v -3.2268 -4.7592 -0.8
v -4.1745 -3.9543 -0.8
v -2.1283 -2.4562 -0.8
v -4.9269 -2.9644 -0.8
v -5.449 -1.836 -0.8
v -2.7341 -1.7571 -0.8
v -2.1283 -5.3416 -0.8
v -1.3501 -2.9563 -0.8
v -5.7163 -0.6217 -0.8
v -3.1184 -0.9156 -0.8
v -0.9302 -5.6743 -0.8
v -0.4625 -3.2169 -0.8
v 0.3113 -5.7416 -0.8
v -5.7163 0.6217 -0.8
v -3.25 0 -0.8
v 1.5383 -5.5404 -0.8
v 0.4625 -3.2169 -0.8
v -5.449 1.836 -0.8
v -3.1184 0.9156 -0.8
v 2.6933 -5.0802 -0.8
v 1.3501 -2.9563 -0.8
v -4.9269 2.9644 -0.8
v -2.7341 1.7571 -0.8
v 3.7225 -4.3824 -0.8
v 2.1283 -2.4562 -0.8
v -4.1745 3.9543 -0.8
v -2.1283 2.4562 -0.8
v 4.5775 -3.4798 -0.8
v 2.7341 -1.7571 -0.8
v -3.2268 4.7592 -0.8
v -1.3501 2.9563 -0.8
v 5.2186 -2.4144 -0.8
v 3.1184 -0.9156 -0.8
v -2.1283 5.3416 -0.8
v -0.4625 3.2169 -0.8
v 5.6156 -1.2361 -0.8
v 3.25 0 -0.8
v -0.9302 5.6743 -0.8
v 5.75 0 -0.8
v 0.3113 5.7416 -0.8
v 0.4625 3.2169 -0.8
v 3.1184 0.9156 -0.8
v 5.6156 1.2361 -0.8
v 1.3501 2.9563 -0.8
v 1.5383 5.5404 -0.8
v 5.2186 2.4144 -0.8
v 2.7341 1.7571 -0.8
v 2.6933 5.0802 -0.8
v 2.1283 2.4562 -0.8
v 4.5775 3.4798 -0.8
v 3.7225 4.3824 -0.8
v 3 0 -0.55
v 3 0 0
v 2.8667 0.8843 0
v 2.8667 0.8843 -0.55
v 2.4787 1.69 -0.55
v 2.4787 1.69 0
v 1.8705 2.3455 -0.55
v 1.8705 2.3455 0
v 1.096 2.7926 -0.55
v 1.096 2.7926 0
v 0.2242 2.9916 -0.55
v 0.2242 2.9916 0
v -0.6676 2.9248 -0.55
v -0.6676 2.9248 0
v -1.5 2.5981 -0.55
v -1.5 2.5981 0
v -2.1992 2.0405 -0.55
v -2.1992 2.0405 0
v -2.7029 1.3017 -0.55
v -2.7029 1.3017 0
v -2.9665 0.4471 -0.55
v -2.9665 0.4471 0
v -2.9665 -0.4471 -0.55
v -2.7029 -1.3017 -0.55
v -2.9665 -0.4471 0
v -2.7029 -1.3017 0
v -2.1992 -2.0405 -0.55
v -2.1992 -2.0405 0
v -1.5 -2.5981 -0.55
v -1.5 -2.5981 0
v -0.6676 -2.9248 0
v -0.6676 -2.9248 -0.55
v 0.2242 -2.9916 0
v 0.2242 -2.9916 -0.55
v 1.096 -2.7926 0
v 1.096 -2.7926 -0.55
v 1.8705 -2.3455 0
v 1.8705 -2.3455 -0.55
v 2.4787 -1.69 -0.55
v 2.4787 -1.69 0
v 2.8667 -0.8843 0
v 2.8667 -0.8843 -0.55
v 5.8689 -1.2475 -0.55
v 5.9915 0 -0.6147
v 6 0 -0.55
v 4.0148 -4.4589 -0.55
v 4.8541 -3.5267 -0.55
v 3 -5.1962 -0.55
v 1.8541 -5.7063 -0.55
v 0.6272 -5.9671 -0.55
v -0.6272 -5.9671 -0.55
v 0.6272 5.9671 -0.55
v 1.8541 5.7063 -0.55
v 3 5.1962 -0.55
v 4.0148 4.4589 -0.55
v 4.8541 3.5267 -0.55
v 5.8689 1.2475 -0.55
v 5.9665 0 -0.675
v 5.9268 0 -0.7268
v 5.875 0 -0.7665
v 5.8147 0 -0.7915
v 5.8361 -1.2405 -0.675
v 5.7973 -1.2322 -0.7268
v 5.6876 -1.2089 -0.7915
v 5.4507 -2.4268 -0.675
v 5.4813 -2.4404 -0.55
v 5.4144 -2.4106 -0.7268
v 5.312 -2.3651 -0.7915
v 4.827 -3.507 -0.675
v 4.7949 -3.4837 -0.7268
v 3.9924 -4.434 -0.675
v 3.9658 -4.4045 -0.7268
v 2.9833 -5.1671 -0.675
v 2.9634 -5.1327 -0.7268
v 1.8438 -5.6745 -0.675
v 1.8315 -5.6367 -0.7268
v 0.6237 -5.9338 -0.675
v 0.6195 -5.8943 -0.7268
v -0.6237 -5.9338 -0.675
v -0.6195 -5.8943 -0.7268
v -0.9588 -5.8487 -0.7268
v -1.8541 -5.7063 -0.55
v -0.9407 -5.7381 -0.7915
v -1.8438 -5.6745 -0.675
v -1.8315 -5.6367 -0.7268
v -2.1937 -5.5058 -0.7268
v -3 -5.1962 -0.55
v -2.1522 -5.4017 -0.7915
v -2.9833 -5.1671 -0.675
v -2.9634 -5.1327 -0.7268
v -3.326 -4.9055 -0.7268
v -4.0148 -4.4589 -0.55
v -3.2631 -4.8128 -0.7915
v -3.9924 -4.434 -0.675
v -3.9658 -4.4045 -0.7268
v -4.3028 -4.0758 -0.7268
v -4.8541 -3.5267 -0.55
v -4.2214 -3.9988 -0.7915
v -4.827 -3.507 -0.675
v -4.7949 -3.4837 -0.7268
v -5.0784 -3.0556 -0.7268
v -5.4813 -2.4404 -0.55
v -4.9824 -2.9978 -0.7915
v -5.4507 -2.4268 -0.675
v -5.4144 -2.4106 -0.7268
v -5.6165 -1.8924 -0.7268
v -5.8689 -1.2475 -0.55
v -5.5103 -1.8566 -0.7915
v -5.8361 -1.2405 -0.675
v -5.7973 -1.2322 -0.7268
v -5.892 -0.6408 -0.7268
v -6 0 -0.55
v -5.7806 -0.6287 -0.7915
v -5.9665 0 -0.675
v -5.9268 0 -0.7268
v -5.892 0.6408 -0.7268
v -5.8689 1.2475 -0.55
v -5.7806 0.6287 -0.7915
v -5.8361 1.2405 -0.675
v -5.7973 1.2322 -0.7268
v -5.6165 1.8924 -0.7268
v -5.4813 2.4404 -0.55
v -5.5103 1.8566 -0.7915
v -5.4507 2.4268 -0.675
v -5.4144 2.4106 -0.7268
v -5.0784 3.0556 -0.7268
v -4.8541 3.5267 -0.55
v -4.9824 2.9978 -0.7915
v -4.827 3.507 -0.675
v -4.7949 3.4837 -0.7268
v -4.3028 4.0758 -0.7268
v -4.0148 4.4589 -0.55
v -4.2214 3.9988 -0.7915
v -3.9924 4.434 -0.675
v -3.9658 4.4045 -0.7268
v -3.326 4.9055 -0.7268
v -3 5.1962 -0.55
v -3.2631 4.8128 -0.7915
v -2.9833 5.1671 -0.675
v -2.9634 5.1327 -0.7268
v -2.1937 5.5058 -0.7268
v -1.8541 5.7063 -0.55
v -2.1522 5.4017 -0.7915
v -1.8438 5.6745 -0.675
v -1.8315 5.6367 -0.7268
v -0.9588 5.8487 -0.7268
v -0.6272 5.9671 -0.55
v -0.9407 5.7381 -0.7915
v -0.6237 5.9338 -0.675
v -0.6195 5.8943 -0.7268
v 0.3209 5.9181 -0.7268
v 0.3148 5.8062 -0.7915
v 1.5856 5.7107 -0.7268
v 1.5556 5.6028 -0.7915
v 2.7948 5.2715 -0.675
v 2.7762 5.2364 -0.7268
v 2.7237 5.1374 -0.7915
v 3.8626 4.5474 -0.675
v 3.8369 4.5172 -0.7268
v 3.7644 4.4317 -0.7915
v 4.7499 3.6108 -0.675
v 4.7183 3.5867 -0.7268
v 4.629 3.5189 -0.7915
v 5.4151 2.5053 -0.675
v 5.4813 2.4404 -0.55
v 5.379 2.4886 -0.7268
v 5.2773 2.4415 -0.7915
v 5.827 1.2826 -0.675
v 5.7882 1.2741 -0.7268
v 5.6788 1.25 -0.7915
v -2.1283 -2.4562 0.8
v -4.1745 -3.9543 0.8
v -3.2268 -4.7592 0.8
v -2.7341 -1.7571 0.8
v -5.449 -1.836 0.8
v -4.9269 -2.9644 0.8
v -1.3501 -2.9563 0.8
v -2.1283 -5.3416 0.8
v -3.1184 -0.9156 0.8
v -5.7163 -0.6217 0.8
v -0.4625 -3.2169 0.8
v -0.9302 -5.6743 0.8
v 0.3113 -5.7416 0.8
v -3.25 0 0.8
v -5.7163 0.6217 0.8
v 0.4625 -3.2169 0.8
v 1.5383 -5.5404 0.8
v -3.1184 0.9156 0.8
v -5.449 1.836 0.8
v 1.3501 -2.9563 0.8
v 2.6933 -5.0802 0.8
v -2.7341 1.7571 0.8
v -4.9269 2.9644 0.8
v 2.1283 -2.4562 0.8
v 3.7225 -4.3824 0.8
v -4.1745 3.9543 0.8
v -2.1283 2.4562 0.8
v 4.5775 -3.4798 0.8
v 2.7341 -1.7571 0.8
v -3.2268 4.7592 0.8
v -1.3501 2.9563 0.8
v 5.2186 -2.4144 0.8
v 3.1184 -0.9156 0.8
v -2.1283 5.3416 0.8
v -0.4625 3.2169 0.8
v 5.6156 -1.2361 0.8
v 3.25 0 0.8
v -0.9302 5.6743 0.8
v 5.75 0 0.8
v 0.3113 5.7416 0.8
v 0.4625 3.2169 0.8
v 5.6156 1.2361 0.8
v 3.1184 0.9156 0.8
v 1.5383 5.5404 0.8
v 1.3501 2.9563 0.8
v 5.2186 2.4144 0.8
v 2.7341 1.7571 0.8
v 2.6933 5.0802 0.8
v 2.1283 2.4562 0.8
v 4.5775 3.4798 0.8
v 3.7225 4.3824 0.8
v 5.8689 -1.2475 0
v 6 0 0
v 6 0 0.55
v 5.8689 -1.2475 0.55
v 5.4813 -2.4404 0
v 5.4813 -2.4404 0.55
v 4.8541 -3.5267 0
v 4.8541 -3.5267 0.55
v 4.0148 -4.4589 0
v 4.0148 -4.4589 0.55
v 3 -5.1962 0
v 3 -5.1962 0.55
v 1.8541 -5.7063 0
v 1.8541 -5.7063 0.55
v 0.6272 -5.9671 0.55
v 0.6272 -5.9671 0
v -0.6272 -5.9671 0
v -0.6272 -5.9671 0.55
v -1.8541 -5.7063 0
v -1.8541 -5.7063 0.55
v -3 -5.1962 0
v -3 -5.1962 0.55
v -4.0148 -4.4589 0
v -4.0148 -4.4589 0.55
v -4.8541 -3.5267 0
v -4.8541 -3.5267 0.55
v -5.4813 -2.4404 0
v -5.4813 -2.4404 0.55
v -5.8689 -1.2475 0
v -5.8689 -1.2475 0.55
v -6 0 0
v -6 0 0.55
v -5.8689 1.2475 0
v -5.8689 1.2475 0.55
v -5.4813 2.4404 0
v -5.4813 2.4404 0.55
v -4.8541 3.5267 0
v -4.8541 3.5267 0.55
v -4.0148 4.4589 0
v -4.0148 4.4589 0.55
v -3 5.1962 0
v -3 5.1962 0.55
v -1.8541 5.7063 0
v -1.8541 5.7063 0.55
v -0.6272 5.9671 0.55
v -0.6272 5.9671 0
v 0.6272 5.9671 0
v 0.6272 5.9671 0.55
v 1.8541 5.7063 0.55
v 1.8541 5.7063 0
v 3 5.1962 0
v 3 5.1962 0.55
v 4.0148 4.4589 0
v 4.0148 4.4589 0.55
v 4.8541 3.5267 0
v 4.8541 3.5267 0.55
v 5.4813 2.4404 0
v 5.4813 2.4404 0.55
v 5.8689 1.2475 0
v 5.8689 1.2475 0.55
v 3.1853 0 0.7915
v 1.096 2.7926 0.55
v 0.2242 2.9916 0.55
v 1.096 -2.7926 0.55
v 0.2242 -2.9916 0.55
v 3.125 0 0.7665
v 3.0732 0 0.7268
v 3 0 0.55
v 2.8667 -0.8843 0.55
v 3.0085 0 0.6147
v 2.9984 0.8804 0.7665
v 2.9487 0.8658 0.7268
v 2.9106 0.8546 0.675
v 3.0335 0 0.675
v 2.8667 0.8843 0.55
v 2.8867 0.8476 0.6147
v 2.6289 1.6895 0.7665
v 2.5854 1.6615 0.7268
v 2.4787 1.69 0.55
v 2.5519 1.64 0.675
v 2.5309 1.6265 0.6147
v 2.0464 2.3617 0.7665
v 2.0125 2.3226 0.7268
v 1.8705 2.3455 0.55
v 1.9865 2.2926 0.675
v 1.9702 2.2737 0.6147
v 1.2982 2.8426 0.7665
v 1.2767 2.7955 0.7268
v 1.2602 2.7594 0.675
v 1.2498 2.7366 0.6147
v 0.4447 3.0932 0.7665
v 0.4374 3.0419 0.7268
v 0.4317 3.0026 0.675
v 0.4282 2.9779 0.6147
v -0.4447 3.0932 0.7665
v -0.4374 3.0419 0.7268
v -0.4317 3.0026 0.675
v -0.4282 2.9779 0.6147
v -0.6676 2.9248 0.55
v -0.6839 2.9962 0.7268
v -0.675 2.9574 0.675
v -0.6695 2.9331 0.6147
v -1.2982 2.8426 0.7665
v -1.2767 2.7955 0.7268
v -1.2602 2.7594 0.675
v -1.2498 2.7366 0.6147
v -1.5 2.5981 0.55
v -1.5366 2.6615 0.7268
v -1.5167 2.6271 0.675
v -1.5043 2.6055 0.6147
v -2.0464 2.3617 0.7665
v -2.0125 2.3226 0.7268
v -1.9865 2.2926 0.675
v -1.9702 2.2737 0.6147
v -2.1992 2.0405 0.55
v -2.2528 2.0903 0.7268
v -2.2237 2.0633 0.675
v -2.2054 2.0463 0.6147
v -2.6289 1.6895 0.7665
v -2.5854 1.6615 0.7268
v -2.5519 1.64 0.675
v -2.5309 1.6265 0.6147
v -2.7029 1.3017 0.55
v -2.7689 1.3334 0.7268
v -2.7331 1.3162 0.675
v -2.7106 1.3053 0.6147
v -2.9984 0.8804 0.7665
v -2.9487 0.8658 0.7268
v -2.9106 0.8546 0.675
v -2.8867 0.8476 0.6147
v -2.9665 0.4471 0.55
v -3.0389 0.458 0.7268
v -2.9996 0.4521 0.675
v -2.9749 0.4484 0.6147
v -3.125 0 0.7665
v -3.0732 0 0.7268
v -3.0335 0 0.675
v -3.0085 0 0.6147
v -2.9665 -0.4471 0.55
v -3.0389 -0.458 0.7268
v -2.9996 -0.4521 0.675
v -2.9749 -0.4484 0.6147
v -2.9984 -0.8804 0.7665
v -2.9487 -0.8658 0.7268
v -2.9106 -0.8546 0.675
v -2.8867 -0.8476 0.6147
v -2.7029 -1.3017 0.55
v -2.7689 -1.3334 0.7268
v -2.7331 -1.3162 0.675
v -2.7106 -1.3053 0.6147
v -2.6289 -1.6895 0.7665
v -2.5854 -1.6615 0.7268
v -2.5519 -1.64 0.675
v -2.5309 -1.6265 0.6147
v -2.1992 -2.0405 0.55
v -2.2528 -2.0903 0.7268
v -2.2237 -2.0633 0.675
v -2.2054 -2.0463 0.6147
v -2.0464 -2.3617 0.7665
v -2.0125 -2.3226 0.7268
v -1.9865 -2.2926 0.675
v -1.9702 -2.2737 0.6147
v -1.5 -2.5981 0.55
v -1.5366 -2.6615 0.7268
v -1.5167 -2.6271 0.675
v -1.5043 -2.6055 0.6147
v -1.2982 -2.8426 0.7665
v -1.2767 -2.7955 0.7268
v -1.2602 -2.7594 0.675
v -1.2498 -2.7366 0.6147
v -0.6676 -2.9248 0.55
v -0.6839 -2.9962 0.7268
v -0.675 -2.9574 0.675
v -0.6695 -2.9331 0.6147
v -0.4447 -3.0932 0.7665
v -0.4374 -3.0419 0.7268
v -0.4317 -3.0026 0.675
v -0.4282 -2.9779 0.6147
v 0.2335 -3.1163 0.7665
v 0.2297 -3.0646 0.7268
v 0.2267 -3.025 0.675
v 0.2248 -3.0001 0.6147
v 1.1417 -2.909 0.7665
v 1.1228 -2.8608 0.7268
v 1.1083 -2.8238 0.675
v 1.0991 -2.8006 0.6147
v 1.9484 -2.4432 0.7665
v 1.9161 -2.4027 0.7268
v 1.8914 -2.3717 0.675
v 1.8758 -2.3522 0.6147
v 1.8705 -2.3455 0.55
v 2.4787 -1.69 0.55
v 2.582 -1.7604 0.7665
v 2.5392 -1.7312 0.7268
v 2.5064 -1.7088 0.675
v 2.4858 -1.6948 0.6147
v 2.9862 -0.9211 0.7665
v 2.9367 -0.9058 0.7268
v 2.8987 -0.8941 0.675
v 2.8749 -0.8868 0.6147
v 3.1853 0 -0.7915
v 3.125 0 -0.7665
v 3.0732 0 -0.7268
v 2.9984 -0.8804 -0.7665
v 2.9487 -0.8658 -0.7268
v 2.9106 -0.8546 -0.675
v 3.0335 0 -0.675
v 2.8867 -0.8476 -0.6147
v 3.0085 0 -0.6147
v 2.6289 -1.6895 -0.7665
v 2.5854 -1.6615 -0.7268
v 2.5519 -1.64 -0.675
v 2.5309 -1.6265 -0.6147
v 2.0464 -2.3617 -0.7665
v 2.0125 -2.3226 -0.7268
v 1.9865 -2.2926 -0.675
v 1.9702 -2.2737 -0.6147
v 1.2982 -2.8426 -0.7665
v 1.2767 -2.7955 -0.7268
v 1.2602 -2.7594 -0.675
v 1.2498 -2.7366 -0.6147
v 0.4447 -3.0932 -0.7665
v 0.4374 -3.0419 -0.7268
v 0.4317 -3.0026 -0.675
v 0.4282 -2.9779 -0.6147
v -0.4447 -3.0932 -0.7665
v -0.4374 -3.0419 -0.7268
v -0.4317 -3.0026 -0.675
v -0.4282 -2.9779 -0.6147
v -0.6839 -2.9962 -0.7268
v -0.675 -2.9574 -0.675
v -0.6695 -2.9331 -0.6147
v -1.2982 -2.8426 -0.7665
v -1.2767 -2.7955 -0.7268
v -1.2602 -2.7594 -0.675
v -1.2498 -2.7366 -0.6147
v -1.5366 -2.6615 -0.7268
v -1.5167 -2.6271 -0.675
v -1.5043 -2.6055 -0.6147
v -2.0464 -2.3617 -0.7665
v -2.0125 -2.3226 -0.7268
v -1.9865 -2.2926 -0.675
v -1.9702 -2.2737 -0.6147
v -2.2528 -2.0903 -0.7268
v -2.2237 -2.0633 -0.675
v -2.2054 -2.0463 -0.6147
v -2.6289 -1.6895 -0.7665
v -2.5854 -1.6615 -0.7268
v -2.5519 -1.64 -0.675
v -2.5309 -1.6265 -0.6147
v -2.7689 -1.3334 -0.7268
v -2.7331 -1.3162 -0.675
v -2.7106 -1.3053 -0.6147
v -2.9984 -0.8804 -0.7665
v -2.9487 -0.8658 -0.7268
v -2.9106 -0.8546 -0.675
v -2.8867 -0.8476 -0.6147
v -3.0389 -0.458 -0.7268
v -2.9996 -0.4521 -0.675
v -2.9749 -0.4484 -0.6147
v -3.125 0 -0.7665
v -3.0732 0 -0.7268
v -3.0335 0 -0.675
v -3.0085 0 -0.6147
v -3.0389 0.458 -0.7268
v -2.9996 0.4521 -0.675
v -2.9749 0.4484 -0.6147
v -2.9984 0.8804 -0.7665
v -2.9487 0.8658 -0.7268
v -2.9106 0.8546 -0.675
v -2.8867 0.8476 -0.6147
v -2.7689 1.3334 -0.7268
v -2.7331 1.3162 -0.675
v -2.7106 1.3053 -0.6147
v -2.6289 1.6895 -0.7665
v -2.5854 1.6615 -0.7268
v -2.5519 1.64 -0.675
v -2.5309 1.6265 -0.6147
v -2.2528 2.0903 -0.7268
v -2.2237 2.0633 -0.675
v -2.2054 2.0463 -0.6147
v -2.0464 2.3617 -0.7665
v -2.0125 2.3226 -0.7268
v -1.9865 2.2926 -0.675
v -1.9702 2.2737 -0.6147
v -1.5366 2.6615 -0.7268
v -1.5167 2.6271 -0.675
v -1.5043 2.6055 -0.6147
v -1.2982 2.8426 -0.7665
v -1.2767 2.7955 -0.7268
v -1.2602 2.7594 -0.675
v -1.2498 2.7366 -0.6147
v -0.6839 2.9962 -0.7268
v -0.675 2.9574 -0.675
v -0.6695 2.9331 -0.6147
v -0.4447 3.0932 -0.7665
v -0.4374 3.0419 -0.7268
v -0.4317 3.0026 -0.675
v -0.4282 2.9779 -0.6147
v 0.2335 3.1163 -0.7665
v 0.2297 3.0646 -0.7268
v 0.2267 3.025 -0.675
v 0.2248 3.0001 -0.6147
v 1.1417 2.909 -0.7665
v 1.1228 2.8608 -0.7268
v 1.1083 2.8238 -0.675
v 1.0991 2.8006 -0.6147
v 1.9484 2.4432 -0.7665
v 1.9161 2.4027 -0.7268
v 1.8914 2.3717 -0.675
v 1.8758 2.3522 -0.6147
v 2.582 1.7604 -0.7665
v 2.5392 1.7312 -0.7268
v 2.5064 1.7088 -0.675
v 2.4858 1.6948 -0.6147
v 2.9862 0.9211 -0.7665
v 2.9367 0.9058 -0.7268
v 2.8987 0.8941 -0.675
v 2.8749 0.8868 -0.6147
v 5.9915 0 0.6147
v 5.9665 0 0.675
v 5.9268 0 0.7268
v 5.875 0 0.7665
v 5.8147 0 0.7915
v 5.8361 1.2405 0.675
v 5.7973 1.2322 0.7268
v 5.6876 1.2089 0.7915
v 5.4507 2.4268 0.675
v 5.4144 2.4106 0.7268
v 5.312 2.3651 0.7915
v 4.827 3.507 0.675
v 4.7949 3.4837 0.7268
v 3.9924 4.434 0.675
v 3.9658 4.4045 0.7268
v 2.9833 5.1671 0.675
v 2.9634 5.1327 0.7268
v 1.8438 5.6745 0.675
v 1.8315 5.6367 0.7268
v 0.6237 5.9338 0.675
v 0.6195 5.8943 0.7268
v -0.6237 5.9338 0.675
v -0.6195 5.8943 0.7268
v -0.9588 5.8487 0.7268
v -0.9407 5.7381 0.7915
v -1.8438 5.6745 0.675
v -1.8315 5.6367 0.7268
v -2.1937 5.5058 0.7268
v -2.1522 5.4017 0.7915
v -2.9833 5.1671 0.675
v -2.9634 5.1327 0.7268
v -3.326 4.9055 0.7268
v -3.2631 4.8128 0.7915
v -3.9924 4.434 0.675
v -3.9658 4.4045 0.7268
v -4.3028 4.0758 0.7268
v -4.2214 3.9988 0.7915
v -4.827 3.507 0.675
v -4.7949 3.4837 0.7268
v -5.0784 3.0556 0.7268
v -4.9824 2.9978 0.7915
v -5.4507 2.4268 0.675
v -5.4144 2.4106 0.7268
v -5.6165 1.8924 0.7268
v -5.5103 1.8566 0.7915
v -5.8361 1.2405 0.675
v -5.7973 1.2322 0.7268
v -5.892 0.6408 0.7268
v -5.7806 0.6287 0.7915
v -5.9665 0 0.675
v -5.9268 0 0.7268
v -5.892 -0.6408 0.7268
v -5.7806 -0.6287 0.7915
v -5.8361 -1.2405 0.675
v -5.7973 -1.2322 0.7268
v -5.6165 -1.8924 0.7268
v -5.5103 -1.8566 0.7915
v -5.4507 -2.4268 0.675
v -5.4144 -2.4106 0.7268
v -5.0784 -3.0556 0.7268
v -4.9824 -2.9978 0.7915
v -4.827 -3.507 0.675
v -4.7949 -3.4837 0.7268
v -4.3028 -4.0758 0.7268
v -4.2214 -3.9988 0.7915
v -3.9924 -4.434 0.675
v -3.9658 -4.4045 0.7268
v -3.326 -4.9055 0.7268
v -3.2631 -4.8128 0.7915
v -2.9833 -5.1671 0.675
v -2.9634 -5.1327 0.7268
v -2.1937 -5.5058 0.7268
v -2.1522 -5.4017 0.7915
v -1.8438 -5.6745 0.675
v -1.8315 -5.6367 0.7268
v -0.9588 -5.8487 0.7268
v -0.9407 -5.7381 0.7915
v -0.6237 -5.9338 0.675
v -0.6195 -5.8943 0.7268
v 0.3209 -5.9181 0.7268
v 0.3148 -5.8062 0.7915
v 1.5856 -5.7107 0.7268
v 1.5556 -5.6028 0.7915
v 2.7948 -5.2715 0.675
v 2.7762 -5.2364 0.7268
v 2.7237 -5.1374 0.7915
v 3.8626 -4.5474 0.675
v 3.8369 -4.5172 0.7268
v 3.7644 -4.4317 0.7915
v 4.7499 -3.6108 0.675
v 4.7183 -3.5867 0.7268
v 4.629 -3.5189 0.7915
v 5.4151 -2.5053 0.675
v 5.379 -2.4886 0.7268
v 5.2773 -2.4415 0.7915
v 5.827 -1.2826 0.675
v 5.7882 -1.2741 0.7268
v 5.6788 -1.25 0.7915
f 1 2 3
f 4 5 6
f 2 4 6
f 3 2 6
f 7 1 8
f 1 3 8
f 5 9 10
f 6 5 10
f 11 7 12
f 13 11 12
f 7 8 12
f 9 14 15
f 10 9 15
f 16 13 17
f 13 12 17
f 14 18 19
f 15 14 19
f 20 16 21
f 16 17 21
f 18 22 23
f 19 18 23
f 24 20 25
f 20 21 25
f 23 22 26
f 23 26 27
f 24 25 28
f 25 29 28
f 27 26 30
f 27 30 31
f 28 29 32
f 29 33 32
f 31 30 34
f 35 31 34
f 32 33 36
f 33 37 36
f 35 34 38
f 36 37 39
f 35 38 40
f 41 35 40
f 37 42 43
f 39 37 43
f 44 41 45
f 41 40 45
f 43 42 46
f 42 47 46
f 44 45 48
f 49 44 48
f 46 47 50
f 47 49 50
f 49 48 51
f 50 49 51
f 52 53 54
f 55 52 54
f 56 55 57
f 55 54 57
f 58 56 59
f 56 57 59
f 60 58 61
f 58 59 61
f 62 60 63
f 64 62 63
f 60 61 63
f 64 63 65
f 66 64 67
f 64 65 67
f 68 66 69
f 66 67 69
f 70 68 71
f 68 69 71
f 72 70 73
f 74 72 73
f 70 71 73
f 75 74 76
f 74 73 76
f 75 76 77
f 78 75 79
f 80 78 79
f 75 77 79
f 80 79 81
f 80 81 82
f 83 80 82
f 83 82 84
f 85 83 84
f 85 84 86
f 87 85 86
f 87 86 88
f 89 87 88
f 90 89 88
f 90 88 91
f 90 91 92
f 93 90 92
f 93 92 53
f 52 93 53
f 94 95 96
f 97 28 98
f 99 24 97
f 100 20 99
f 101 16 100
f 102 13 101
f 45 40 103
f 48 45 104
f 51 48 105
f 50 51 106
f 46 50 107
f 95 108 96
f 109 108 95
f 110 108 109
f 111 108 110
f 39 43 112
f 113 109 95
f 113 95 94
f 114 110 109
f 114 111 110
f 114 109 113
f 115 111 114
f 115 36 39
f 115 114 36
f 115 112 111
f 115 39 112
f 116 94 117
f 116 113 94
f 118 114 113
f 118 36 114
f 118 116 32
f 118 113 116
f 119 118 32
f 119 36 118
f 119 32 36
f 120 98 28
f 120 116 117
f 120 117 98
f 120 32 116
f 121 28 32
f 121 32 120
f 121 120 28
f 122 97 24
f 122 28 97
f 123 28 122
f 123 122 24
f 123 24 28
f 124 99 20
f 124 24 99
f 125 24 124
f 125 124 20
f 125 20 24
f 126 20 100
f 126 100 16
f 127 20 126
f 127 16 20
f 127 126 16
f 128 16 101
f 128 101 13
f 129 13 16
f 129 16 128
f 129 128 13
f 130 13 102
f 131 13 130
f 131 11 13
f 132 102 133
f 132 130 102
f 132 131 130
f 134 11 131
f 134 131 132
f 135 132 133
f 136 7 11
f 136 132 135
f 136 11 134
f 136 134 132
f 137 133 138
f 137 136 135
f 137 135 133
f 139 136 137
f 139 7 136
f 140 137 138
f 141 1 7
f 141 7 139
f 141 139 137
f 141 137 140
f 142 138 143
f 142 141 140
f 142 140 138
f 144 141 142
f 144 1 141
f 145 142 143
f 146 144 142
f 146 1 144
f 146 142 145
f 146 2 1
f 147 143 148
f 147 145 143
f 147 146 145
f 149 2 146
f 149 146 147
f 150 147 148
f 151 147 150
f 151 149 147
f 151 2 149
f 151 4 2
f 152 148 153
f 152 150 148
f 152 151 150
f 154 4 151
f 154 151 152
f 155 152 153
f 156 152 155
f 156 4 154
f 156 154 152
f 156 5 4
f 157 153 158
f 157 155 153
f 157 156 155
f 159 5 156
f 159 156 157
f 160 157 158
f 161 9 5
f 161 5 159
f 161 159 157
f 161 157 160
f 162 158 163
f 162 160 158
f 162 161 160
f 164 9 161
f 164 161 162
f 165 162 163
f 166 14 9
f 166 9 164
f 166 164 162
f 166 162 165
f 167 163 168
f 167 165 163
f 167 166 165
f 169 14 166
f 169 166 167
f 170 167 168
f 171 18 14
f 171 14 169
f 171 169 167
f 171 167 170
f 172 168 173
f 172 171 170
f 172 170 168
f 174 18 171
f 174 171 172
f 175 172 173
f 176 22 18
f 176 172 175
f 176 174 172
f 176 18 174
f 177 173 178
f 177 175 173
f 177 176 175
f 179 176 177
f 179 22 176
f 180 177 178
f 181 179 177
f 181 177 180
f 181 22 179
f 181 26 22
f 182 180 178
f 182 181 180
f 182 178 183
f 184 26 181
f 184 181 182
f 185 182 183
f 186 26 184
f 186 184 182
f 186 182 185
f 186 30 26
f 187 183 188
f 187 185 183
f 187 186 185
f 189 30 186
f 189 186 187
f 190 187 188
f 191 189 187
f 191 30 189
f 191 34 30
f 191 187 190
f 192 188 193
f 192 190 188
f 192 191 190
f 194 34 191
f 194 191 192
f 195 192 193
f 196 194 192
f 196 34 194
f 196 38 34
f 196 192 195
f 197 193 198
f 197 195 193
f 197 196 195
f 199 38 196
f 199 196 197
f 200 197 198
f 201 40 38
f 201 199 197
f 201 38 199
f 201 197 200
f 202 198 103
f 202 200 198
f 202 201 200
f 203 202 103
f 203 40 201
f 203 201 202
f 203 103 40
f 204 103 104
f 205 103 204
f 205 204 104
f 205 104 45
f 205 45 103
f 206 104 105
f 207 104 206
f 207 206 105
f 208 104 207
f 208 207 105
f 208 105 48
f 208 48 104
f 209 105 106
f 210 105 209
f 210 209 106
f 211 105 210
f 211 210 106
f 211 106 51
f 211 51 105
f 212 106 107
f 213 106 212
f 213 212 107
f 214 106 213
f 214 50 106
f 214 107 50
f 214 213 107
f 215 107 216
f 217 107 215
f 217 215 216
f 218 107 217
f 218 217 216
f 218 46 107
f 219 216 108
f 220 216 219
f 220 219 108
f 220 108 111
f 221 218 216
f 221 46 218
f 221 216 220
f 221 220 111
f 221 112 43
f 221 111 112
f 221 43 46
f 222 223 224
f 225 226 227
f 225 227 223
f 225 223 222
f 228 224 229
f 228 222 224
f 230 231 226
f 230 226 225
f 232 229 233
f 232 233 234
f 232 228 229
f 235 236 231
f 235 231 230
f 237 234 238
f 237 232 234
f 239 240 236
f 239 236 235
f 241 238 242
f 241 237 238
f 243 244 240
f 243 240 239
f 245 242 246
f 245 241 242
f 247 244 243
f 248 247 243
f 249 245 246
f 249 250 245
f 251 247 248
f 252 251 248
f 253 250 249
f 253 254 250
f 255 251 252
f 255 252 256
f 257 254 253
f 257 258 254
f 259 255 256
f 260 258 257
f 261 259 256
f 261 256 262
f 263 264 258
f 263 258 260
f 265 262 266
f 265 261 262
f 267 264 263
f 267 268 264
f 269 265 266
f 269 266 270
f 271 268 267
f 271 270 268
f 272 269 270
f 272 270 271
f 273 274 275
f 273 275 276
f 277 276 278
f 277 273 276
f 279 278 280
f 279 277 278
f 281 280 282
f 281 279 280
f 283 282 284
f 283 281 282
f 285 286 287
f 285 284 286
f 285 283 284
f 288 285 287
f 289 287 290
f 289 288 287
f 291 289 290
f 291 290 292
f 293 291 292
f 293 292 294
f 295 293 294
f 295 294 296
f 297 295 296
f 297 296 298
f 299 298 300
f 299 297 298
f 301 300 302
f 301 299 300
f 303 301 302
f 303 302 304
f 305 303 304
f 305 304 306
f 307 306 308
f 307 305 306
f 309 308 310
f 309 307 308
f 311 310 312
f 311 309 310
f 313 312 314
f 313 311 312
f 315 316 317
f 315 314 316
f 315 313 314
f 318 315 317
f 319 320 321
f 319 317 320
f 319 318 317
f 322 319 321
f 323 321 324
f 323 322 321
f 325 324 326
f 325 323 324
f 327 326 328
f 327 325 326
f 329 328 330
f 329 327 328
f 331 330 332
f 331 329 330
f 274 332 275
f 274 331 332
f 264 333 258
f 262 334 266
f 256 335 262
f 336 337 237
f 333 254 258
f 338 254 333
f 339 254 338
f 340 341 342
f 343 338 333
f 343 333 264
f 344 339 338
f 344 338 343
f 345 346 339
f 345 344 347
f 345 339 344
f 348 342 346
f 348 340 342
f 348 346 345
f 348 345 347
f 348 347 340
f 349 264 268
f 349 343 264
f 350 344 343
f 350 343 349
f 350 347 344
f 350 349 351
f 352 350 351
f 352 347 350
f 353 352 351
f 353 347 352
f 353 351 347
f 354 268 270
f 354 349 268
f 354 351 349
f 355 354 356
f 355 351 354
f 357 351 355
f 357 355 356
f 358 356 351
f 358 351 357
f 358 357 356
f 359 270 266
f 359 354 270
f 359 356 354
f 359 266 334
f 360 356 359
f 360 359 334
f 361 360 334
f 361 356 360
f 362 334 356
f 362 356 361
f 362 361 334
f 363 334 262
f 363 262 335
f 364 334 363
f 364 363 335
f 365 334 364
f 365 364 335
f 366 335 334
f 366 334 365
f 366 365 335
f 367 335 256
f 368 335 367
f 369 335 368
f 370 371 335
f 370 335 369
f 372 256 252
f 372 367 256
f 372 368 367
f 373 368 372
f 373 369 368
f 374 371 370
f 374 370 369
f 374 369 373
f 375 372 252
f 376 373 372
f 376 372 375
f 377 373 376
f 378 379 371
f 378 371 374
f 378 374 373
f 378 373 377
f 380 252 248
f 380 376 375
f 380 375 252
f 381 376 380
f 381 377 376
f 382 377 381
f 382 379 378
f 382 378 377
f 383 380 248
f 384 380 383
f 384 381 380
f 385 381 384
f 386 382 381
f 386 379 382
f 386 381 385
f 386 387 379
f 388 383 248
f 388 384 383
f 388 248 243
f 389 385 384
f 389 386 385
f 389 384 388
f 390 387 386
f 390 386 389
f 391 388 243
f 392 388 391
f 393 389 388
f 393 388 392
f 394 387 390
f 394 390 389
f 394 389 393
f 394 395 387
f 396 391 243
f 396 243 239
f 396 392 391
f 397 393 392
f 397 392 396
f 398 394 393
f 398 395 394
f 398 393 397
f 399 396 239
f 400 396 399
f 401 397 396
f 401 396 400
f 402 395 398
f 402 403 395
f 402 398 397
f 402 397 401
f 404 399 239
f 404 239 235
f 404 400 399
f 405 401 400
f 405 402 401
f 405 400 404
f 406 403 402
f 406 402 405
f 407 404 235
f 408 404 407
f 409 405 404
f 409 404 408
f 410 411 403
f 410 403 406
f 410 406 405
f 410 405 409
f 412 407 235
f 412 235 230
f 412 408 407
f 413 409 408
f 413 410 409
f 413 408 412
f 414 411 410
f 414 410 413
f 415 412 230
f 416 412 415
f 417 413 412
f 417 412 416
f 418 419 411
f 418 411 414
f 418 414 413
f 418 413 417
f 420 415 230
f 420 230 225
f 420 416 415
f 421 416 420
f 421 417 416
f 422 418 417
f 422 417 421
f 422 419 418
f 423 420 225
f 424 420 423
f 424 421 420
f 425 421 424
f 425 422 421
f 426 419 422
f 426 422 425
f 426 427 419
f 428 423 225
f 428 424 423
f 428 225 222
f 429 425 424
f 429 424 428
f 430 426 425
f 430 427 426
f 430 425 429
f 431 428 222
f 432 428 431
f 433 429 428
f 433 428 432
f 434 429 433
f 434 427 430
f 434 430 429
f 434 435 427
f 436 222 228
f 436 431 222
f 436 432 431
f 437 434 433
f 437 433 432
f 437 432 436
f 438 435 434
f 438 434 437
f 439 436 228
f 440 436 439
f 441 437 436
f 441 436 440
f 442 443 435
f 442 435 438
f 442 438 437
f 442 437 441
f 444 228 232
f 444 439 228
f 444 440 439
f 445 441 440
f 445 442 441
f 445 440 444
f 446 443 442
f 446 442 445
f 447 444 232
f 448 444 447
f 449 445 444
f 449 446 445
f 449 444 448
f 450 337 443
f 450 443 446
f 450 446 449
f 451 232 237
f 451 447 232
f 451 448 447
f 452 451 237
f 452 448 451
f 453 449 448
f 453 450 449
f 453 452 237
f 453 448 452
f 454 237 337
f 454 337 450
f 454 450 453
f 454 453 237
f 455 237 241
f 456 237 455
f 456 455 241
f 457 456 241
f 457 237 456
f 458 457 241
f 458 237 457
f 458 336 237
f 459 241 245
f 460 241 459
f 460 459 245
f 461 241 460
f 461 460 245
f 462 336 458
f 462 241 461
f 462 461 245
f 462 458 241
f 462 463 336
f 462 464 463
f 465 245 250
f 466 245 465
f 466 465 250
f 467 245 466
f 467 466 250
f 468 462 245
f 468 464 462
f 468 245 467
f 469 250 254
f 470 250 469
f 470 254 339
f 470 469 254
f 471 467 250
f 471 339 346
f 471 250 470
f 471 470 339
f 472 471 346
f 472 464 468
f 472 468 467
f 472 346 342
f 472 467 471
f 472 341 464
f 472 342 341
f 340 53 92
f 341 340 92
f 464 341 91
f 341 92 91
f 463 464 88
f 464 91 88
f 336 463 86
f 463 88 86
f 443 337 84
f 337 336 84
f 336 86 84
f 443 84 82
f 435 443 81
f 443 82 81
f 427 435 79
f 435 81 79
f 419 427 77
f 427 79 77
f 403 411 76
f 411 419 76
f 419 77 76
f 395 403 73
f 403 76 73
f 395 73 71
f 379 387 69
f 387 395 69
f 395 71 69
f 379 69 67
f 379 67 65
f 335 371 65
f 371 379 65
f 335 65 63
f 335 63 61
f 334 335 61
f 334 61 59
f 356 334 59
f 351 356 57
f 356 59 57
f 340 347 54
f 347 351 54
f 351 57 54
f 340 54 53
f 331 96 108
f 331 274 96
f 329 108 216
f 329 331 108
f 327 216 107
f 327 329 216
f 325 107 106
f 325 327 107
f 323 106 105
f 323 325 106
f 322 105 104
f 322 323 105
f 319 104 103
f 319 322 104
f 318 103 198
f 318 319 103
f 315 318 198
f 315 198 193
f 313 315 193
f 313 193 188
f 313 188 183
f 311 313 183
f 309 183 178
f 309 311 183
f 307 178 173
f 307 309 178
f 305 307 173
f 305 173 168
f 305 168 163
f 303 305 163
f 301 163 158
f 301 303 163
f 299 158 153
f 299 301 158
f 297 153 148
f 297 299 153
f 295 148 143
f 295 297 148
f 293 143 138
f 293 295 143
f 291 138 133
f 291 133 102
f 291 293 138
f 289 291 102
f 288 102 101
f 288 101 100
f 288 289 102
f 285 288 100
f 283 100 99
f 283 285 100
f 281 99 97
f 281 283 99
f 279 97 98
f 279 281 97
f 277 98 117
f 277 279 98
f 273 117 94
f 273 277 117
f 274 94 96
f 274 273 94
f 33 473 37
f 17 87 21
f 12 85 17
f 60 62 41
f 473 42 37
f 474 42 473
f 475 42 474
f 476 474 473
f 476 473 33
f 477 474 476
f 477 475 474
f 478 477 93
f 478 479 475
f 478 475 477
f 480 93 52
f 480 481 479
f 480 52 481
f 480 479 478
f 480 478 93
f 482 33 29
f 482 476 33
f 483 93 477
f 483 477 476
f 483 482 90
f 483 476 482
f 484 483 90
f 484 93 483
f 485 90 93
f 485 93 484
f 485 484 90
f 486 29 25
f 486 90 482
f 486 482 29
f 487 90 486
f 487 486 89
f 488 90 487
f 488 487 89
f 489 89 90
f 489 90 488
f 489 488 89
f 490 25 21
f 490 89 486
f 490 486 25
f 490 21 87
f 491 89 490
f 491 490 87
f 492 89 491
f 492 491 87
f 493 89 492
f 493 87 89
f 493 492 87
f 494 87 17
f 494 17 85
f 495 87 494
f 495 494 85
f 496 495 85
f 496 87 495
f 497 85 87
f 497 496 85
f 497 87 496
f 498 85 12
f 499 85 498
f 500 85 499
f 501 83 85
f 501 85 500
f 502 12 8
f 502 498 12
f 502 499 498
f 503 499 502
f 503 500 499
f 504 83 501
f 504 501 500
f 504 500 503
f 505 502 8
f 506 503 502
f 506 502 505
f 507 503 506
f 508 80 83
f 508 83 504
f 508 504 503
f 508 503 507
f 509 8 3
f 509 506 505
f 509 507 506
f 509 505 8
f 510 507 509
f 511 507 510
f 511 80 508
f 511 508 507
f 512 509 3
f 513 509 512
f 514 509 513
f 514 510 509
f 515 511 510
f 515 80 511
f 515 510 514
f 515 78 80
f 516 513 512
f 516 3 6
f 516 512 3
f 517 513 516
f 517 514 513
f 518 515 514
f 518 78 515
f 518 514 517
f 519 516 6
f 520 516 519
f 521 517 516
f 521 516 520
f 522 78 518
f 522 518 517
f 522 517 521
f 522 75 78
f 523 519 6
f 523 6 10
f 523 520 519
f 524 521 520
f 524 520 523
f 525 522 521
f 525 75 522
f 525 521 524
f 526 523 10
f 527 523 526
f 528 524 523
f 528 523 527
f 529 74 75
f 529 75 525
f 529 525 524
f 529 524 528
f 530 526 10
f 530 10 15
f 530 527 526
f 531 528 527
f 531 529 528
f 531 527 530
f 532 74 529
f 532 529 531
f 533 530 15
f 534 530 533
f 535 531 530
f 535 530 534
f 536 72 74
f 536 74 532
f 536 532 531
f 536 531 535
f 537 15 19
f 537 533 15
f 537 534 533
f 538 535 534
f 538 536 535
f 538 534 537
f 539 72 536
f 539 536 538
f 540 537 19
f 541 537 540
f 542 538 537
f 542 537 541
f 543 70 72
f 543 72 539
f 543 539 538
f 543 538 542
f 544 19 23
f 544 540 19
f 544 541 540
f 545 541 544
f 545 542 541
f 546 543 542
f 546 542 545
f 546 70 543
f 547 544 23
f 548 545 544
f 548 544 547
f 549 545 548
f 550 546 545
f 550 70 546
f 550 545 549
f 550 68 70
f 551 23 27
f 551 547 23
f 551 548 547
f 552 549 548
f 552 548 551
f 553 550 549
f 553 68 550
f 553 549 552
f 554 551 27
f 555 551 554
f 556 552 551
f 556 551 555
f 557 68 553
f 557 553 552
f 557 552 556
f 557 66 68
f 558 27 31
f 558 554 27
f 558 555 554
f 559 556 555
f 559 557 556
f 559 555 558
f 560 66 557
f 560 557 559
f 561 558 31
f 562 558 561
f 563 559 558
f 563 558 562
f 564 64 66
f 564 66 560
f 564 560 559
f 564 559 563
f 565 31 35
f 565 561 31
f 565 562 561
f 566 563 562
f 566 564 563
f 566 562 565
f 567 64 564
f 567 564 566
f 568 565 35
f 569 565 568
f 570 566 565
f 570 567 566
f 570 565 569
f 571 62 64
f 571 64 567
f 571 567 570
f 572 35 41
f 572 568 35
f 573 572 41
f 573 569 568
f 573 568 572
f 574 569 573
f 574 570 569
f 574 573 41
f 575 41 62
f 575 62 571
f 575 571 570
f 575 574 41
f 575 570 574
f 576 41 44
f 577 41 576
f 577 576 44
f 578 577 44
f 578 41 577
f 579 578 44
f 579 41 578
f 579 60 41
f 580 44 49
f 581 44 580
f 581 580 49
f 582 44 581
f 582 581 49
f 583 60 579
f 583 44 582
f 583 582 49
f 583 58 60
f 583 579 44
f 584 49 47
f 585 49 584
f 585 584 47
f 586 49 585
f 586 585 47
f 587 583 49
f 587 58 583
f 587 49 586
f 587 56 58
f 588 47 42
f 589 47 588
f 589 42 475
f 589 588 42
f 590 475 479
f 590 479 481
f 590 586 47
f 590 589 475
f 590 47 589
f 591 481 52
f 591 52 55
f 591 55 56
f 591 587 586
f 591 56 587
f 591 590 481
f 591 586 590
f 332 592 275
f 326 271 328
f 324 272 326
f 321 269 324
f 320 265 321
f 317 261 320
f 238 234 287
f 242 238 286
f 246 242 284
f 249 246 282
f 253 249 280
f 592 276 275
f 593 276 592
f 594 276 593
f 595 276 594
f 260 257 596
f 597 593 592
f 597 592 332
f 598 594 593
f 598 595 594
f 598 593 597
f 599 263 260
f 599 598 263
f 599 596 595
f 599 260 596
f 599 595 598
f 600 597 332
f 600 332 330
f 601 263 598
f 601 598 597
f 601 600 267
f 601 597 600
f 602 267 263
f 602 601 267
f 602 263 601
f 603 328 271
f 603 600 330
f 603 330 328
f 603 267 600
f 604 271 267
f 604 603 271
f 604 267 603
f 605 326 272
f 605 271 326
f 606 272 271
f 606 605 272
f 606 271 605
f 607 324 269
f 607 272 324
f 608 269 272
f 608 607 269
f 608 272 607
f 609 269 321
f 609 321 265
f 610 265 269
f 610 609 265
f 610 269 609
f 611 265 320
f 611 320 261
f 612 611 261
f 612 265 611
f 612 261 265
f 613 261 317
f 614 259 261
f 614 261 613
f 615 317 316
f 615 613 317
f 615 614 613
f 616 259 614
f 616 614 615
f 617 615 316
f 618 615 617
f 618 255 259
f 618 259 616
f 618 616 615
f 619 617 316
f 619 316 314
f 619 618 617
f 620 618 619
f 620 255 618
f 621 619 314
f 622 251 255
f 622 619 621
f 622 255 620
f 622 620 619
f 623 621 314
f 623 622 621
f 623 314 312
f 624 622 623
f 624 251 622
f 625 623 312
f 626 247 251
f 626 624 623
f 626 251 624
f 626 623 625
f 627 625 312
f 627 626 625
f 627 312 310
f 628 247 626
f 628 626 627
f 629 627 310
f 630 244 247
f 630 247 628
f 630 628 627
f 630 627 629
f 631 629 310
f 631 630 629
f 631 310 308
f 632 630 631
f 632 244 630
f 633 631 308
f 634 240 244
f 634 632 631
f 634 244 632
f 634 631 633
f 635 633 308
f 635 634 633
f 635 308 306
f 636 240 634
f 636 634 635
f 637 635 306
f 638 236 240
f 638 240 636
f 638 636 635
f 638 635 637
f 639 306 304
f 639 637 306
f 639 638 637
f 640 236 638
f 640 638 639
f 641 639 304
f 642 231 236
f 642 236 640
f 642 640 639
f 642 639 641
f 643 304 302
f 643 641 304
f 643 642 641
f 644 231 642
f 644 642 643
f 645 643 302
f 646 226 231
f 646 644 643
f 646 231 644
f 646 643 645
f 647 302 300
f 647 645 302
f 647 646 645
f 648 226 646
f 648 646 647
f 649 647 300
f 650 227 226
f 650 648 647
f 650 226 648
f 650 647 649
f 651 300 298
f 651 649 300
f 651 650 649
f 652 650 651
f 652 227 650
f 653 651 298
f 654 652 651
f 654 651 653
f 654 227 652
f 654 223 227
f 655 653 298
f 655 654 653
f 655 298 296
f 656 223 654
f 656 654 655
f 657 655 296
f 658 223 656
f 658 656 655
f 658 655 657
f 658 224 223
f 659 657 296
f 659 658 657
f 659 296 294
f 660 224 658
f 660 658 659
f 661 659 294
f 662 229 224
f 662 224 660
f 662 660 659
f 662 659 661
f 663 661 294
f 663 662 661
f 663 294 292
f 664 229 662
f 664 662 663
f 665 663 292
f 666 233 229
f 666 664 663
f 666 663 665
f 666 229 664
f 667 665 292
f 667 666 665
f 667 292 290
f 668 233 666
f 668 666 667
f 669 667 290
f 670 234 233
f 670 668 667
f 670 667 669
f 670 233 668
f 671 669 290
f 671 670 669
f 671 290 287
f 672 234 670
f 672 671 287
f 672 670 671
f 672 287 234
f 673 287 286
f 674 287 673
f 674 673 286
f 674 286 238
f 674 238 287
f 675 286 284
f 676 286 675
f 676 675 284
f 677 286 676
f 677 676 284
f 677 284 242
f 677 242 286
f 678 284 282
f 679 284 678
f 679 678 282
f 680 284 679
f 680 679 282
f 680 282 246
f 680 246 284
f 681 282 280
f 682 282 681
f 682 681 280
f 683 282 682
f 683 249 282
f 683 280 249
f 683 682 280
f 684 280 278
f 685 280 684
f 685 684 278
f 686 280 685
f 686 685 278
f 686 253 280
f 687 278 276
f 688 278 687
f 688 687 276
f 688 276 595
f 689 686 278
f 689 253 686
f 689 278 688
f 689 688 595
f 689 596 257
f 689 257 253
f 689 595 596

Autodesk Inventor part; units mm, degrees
ref_plane "YZ Plane" through (0, 0, 0) normal (1, 0, 0) x (0, 1, 0)
ref_plane "XZ Plane" through (0, 0, 0) normal (0, 1, 0) x (-1, 0, 0)
ref_plane "XY Plane" through (0, 0, 0) normal (0, 0, 1) x (1, 0, 0)
sketch "Skizze1" plane through (0, 0, 0) normal (0, 0, 1) x (1, 0, 0)
  circle A0 centre (0, 0) radius 3
  circle A1 centre (0, 0) radius 6
  dimension "d0" = 6
  dimension "d1" = 12
extrude "Extrusion1" add sketch "Skizze1" along normal mid plane 1.6
fillet "Rundung1" radius 0.25 4 edges at (-6, 0, 0.8) (-6, 0, -0.8) (-3, 0, 0.8) (-3, 0, -0.8)
properties part number "900-80-WASHERS-ISO8738-8" material "Edelstahl"
